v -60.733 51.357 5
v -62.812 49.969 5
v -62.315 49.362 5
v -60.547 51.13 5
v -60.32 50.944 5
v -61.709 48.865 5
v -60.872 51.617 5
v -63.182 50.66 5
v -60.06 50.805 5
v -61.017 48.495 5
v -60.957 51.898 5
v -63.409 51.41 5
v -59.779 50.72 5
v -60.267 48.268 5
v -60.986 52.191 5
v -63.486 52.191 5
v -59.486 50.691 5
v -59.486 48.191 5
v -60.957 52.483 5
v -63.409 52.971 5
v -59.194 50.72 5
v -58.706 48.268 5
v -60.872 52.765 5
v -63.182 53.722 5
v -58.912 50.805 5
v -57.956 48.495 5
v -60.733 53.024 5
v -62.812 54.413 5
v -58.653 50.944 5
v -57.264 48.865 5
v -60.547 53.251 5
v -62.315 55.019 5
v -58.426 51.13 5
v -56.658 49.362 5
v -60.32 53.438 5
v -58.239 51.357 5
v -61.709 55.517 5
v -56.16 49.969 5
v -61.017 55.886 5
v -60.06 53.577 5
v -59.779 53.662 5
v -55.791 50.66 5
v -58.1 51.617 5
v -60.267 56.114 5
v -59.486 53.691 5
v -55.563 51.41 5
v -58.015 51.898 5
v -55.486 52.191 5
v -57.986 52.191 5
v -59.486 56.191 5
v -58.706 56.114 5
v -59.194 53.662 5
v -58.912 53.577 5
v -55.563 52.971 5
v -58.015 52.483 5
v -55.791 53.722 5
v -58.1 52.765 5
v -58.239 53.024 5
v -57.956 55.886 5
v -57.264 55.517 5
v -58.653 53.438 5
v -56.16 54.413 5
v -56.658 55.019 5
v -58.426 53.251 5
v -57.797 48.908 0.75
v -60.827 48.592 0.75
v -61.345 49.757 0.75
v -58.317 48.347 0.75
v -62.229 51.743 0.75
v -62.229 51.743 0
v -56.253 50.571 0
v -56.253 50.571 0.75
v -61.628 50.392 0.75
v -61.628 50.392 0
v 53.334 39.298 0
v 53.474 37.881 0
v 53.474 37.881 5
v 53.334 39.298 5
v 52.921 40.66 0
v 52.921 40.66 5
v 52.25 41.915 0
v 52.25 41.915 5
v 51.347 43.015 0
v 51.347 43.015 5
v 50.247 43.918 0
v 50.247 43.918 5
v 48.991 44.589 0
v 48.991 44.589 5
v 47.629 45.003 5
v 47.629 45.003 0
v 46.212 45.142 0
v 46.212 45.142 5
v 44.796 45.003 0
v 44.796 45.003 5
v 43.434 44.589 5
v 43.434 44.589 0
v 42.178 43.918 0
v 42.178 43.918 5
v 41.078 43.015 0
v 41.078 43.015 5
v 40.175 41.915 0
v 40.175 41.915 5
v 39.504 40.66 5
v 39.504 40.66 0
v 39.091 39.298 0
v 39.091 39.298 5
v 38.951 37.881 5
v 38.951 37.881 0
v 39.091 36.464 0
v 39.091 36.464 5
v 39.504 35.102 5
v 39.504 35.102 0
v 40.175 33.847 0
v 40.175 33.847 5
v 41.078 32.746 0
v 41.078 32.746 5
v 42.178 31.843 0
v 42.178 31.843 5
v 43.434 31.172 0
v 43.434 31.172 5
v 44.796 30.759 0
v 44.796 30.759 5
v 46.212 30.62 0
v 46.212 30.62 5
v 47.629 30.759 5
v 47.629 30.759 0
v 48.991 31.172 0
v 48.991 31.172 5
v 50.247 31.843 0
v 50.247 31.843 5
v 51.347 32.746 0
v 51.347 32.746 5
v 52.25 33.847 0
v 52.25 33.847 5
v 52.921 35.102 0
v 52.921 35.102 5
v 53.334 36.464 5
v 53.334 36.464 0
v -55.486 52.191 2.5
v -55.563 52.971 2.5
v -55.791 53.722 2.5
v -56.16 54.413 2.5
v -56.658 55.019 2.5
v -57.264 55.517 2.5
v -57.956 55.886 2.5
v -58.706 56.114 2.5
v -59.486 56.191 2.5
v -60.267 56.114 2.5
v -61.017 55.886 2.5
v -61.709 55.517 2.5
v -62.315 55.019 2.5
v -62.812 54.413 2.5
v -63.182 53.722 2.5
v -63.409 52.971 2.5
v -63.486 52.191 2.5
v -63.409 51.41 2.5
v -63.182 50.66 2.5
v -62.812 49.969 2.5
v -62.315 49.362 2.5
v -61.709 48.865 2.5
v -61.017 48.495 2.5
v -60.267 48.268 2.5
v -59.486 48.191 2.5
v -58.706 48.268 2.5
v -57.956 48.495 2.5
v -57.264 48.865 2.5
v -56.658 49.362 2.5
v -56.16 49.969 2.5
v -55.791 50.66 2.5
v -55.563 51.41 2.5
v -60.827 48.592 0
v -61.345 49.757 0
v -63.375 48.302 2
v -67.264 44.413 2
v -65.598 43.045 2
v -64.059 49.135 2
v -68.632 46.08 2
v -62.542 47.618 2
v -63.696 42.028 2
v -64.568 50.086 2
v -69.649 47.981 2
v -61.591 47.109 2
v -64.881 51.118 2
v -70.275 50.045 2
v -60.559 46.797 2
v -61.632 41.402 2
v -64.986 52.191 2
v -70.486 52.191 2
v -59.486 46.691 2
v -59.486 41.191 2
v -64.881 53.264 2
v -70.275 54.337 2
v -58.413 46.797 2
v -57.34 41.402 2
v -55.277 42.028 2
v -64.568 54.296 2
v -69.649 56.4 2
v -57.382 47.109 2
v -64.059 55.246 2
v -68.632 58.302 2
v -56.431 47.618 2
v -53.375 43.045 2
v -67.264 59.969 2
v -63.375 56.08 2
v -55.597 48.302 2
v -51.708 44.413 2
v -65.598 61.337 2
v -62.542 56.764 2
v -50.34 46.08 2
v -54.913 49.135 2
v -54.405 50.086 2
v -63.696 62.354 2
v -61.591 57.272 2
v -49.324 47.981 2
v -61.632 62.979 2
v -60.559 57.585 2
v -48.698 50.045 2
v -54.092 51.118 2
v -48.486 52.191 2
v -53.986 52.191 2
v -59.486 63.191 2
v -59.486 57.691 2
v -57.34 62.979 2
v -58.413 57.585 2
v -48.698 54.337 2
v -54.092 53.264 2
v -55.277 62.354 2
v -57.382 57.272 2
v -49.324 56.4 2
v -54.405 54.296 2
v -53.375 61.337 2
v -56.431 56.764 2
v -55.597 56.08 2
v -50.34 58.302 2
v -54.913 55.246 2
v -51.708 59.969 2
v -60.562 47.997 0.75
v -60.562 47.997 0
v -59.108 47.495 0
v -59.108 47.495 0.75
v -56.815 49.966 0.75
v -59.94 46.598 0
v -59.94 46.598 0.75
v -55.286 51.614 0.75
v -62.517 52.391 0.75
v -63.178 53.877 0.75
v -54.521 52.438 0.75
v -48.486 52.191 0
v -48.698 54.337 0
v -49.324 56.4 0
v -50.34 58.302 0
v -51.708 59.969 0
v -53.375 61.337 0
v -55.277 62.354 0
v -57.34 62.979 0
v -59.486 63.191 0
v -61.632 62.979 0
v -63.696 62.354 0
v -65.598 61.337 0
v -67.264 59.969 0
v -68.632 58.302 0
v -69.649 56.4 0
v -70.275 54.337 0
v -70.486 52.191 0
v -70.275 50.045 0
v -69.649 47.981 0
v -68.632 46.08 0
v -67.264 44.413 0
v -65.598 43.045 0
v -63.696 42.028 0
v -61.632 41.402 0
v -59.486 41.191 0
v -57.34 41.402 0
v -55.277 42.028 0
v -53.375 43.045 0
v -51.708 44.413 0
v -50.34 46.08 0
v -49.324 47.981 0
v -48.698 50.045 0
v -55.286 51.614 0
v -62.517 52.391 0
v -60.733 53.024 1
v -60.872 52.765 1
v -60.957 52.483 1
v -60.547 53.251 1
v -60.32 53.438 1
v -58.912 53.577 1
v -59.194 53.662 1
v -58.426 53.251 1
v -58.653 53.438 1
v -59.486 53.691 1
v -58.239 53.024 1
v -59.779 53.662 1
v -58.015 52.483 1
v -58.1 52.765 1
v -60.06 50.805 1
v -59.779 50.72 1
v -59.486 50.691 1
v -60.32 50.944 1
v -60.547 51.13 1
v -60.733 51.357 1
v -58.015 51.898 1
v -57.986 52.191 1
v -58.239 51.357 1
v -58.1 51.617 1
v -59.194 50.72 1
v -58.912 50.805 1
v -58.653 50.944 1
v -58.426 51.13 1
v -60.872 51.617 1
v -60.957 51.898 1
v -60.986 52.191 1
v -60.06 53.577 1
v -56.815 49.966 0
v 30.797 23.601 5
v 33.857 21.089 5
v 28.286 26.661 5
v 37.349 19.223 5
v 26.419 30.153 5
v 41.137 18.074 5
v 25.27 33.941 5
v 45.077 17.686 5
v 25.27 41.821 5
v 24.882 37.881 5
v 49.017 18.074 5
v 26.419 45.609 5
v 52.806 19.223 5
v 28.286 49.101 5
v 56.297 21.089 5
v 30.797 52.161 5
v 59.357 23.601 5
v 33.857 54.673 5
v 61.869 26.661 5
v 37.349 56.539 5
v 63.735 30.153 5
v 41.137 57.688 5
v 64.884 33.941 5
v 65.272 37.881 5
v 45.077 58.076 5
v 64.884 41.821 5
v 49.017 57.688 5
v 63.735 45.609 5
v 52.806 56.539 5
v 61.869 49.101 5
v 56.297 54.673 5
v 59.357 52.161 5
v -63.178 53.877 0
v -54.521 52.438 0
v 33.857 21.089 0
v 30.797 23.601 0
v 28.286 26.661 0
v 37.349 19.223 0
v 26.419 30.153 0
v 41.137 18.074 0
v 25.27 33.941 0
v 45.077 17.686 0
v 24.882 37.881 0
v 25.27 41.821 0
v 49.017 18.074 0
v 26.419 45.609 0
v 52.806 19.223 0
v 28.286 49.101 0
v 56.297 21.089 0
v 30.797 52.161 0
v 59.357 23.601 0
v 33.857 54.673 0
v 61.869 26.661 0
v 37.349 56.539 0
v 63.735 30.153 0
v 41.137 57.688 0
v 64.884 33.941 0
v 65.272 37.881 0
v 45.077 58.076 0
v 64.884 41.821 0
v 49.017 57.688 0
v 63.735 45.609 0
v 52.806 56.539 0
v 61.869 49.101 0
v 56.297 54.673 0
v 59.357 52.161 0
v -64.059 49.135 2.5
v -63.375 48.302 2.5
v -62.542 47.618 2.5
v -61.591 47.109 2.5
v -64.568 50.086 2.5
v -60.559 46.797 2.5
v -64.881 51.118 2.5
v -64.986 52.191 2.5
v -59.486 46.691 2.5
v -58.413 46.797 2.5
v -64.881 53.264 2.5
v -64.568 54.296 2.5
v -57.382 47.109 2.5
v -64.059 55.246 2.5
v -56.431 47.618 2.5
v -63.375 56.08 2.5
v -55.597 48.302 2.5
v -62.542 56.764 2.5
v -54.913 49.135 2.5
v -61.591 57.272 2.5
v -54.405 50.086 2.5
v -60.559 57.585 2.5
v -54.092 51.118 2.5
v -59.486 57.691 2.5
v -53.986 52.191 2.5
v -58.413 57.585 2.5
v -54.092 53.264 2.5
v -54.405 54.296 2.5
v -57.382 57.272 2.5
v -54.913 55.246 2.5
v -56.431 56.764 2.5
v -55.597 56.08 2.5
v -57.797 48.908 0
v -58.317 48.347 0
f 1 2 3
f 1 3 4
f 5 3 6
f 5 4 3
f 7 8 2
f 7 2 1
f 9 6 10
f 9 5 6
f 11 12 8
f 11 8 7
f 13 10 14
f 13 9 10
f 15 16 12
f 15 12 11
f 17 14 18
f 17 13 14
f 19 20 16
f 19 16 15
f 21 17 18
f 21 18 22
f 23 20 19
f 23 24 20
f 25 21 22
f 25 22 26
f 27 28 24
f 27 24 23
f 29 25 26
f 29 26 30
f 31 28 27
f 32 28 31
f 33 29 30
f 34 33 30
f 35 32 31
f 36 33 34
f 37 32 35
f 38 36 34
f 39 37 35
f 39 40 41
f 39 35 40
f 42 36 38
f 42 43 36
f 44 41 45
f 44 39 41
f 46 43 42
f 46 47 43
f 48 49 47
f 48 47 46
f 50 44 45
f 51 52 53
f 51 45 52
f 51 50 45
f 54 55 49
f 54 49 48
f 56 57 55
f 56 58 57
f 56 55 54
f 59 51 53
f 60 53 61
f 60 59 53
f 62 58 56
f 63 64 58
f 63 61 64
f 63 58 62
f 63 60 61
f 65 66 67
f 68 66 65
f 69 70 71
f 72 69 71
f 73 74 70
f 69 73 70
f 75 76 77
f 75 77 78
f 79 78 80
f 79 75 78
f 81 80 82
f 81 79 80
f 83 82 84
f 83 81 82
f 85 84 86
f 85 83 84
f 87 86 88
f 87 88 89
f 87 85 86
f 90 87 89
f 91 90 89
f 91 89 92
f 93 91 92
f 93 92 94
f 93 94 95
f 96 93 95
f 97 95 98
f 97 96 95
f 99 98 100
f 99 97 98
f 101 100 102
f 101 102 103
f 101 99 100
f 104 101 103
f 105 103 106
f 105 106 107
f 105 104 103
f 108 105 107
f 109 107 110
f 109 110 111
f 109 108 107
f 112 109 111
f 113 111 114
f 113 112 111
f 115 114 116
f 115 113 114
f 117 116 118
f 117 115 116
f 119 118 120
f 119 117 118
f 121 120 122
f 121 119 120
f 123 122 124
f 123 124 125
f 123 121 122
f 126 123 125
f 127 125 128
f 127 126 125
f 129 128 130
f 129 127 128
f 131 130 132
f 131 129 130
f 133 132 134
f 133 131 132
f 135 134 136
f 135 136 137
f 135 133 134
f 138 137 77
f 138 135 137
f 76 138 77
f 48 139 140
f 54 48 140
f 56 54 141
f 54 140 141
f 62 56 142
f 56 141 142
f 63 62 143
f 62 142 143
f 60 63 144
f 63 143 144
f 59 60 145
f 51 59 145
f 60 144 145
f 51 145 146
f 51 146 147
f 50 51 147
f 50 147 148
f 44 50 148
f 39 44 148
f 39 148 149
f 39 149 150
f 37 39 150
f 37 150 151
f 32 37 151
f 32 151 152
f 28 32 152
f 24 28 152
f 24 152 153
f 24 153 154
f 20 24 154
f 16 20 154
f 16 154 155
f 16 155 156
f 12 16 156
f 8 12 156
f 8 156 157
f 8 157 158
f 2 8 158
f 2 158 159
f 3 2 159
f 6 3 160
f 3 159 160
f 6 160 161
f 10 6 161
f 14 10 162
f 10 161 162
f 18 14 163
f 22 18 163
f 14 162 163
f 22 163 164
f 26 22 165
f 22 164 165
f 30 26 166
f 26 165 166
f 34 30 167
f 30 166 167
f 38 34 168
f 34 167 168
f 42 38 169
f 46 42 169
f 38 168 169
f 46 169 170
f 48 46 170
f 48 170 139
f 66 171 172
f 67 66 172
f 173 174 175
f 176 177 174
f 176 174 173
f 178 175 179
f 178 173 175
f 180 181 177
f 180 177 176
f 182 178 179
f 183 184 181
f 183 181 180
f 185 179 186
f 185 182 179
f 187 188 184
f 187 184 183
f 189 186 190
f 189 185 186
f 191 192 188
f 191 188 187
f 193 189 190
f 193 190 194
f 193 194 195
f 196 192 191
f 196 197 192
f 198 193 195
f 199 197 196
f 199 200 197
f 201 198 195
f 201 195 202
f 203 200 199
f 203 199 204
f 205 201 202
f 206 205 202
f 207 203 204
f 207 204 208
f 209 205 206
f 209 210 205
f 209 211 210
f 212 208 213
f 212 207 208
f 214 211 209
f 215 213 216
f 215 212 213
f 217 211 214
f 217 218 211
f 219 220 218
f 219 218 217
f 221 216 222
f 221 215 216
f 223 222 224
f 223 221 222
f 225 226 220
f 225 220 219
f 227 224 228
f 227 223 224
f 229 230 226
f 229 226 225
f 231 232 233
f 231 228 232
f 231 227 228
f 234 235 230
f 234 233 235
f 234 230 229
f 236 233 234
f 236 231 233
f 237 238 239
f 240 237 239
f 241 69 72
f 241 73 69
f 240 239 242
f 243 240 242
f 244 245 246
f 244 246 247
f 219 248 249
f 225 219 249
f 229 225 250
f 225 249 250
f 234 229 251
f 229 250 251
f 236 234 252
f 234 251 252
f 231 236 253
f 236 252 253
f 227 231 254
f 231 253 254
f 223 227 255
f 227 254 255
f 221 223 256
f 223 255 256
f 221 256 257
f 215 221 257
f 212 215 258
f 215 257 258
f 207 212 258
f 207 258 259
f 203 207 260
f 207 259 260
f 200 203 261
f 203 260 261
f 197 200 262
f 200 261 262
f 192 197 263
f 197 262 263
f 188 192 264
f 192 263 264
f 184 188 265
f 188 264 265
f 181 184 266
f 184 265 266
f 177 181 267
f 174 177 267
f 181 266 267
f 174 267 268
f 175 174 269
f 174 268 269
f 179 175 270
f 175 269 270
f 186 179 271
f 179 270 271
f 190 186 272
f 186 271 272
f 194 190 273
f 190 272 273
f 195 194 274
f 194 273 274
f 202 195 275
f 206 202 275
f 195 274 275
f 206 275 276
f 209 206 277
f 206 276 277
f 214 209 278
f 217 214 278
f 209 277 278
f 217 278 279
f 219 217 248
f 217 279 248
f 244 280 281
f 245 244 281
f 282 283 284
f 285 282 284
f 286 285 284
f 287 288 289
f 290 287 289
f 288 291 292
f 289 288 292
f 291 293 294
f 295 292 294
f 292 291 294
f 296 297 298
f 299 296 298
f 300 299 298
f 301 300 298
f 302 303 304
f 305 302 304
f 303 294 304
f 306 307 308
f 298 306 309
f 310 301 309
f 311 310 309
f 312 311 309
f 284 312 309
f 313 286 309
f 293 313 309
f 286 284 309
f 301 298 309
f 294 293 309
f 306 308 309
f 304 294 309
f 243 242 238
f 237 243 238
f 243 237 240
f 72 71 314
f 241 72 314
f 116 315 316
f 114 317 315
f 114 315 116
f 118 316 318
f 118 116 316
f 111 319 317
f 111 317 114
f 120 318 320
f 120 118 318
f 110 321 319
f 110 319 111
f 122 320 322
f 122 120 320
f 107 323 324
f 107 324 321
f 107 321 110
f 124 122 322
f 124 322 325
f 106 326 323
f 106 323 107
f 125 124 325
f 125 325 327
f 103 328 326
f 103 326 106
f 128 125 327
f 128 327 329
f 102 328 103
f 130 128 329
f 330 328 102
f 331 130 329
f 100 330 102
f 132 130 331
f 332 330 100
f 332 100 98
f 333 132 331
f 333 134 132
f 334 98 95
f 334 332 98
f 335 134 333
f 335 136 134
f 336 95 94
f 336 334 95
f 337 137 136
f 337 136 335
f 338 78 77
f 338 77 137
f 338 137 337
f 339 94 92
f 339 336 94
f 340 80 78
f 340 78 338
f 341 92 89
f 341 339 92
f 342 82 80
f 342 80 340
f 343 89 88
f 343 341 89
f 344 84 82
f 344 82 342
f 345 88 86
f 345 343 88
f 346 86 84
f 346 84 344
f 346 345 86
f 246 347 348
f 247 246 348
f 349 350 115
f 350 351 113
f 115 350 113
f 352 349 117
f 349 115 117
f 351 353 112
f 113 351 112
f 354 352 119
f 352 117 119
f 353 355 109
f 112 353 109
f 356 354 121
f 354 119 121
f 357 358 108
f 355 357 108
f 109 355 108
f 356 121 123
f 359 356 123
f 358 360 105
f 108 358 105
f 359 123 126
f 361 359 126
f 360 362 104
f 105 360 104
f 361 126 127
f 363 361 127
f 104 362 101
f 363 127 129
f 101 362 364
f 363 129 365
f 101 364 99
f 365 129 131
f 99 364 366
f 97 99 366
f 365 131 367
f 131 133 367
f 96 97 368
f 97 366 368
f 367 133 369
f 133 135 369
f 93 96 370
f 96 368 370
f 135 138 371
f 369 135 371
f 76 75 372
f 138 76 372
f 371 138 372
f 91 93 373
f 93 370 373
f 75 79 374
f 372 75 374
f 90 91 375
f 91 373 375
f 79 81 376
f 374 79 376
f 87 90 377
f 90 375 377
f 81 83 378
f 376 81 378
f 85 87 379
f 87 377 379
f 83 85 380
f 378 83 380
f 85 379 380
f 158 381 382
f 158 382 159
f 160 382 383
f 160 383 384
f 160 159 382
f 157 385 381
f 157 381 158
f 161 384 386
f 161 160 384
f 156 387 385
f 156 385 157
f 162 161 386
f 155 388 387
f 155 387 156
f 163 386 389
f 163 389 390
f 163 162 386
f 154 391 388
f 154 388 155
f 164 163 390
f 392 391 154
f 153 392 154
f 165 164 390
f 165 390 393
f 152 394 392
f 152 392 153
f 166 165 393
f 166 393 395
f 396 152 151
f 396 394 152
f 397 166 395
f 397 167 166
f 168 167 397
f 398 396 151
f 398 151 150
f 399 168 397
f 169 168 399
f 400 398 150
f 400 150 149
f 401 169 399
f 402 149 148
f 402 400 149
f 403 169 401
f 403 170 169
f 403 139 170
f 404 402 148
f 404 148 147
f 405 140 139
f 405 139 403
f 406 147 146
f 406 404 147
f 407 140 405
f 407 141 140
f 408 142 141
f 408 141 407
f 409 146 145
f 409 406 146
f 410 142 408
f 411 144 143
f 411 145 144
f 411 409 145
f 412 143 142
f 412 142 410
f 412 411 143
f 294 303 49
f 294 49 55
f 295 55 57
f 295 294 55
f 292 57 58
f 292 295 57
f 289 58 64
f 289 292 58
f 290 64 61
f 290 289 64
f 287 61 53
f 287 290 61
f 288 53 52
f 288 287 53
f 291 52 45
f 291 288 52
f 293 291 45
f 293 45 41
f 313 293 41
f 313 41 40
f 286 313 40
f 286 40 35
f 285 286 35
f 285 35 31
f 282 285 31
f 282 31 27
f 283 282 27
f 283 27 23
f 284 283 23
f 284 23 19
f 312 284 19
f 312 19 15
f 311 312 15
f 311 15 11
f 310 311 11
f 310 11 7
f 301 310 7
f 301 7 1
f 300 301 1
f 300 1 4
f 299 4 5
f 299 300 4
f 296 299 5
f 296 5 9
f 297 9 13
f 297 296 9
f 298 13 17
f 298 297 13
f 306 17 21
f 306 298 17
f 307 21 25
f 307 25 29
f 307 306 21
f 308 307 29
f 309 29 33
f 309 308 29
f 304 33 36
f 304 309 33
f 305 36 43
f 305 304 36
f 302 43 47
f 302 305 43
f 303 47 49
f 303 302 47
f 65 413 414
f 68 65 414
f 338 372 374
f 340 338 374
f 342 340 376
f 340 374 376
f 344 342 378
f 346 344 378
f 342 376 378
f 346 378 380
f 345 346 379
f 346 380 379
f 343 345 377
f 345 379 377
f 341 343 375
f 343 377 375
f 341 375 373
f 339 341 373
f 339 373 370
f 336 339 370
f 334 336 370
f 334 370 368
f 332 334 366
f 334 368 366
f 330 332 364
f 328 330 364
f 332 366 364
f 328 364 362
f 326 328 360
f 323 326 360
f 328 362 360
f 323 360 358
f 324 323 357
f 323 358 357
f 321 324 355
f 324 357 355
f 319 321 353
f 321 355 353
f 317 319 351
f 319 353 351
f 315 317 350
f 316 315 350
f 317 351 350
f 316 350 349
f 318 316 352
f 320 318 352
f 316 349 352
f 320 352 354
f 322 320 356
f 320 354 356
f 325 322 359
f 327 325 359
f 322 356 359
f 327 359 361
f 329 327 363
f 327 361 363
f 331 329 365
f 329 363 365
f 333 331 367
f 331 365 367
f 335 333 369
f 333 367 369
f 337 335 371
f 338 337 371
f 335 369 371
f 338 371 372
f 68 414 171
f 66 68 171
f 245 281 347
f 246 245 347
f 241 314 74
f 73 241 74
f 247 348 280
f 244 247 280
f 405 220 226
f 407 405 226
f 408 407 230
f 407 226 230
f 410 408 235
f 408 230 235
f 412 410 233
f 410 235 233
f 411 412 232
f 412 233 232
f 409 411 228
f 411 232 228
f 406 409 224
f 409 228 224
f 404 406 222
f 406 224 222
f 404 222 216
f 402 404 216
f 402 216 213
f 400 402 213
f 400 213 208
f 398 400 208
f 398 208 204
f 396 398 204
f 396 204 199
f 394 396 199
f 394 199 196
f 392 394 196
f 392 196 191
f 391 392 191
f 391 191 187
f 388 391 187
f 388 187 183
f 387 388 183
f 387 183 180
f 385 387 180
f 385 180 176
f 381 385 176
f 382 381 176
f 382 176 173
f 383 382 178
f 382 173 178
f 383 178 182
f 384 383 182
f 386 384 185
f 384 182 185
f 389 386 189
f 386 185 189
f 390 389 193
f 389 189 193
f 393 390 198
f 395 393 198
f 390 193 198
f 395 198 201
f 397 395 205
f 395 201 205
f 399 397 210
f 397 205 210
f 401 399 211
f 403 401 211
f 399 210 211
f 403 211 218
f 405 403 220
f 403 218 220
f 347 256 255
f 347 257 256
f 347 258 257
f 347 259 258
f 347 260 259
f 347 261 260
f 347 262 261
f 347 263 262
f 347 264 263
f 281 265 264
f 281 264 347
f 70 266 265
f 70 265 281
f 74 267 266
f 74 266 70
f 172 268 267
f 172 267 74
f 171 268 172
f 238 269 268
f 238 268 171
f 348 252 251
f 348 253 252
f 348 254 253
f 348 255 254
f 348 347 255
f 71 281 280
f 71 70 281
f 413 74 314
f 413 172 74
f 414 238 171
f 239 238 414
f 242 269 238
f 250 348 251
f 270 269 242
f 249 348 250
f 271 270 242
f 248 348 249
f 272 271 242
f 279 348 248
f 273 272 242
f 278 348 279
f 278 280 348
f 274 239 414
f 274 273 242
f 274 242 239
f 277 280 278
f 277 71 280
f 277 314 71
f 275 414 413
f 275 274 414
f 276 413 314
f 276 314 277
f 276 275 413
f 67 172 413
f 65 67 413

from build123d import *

# Parameters (mm, degrees)
F0_R      = 4
F0_R_2    = 1.5
F1_DEPTH  = 5
F0_R_3    = 5.5
F2_DEPTH  = 2.5
F0_R_4    = 11
F3_DEPTH  = 2
F4_R      = 1.5
F5_DEPTH  = 1
F8_DEPTH  = 0.75
F9_R      = 20.195192
F9_R_2    = 7.261283
F10_DEPTH = 5


with BuildPart() as f1:
    # F0 (on Top) → F1 (new body)
    with BuildSketch(Plane.XY):
        with Locations((-59.486263, 52.190829)):
            Circle(F0_R)
        with Locations((-59.486263, 52.190829)):
            Circle(F0_R_2, mode=Mode.SUBTRACT)
    extrude(amount=F1_DEPTH)

    # F0 (on Top) → F2 (join)
    with BuildSketch(Plane.XY):
        with Locations((-59.486263, 52.190829)):
            Circle(F0_R_3)
        with Locations((-59.486263, 52.190829)):
            Circle(F0_R, mode=Mode.SUBTRACT)
    extrude(amount=F2_DEPTH)

    # F0 (on Top) → F3 (join)
    with BuildSketch(Plane.XY):
        with Locations((-59.486263, 52.190829)):
            Circle(F0_R_4)
        with Locations((-59.486263, 52.190829)):
            Circle(F0_R_3, mode=Mode.SUBTRACT)
    extrude(amount=F3_DEPTH)


with BuildPart() as f5:
    # F4 (on face) → F5 (new body)
    with BuildSketch(Plane(origin=(0, 0, 0), x_dir=(1, 0, 0), z_dir=(0, 0, -1))):
        with Locations((-59.486263, -52.190829)):
            Circle(F4_R)
    extrude(amount=-F5_DEPTH)


with BuildPart() as f1_1:
    add(f1.part)

    # F6: union F5
    add(f5.part)

    # F7 (on face) → F8 (cut)
    with BuildSketch(Plane(origin=(0, 0, 0), x_dir=(1, 0, 0), z_dir=(0, 0, -1))):
        Polygon((-62.517378, -52.391348), (-63.178323, -53.87684), (-54.520878, -52.437834), (-55.285736, -51.613604), align=None)
        Polygon((-59.107626, -47.495039), (-59.939828, -46.598237), (-60.562, -47.996584), align=None)
        Polygon((-62.228812, -51.742789), (-56.25327, -50.570965), (-56.8148, -49.965846), (-61.627975, -50.392392), align=None)
        Polygon((-61.345156, -49.756749), (-57.796522, -48.907918), (-58.317301, -48.346713), (-60.826698, -48.5915), align=None)
    extrude(amount=-F8_DEPTH, mode=Mode.SUBTRACT)


with BuildPart() as f10:
    # F9 (on Top) → F10 (new body)
    with BuildSketch(Plane.XY):
        with Locations((45.077302, 37.880905)):
            Circle(F9_R)
        with Locations((46.212453, 37.880905)):
            Circle(F9_R_2, mode=Mode.SUBTRACT)
    extrude(amount=F10_DEPTH)


solid = Compound([f1_1.part, f10.part])
